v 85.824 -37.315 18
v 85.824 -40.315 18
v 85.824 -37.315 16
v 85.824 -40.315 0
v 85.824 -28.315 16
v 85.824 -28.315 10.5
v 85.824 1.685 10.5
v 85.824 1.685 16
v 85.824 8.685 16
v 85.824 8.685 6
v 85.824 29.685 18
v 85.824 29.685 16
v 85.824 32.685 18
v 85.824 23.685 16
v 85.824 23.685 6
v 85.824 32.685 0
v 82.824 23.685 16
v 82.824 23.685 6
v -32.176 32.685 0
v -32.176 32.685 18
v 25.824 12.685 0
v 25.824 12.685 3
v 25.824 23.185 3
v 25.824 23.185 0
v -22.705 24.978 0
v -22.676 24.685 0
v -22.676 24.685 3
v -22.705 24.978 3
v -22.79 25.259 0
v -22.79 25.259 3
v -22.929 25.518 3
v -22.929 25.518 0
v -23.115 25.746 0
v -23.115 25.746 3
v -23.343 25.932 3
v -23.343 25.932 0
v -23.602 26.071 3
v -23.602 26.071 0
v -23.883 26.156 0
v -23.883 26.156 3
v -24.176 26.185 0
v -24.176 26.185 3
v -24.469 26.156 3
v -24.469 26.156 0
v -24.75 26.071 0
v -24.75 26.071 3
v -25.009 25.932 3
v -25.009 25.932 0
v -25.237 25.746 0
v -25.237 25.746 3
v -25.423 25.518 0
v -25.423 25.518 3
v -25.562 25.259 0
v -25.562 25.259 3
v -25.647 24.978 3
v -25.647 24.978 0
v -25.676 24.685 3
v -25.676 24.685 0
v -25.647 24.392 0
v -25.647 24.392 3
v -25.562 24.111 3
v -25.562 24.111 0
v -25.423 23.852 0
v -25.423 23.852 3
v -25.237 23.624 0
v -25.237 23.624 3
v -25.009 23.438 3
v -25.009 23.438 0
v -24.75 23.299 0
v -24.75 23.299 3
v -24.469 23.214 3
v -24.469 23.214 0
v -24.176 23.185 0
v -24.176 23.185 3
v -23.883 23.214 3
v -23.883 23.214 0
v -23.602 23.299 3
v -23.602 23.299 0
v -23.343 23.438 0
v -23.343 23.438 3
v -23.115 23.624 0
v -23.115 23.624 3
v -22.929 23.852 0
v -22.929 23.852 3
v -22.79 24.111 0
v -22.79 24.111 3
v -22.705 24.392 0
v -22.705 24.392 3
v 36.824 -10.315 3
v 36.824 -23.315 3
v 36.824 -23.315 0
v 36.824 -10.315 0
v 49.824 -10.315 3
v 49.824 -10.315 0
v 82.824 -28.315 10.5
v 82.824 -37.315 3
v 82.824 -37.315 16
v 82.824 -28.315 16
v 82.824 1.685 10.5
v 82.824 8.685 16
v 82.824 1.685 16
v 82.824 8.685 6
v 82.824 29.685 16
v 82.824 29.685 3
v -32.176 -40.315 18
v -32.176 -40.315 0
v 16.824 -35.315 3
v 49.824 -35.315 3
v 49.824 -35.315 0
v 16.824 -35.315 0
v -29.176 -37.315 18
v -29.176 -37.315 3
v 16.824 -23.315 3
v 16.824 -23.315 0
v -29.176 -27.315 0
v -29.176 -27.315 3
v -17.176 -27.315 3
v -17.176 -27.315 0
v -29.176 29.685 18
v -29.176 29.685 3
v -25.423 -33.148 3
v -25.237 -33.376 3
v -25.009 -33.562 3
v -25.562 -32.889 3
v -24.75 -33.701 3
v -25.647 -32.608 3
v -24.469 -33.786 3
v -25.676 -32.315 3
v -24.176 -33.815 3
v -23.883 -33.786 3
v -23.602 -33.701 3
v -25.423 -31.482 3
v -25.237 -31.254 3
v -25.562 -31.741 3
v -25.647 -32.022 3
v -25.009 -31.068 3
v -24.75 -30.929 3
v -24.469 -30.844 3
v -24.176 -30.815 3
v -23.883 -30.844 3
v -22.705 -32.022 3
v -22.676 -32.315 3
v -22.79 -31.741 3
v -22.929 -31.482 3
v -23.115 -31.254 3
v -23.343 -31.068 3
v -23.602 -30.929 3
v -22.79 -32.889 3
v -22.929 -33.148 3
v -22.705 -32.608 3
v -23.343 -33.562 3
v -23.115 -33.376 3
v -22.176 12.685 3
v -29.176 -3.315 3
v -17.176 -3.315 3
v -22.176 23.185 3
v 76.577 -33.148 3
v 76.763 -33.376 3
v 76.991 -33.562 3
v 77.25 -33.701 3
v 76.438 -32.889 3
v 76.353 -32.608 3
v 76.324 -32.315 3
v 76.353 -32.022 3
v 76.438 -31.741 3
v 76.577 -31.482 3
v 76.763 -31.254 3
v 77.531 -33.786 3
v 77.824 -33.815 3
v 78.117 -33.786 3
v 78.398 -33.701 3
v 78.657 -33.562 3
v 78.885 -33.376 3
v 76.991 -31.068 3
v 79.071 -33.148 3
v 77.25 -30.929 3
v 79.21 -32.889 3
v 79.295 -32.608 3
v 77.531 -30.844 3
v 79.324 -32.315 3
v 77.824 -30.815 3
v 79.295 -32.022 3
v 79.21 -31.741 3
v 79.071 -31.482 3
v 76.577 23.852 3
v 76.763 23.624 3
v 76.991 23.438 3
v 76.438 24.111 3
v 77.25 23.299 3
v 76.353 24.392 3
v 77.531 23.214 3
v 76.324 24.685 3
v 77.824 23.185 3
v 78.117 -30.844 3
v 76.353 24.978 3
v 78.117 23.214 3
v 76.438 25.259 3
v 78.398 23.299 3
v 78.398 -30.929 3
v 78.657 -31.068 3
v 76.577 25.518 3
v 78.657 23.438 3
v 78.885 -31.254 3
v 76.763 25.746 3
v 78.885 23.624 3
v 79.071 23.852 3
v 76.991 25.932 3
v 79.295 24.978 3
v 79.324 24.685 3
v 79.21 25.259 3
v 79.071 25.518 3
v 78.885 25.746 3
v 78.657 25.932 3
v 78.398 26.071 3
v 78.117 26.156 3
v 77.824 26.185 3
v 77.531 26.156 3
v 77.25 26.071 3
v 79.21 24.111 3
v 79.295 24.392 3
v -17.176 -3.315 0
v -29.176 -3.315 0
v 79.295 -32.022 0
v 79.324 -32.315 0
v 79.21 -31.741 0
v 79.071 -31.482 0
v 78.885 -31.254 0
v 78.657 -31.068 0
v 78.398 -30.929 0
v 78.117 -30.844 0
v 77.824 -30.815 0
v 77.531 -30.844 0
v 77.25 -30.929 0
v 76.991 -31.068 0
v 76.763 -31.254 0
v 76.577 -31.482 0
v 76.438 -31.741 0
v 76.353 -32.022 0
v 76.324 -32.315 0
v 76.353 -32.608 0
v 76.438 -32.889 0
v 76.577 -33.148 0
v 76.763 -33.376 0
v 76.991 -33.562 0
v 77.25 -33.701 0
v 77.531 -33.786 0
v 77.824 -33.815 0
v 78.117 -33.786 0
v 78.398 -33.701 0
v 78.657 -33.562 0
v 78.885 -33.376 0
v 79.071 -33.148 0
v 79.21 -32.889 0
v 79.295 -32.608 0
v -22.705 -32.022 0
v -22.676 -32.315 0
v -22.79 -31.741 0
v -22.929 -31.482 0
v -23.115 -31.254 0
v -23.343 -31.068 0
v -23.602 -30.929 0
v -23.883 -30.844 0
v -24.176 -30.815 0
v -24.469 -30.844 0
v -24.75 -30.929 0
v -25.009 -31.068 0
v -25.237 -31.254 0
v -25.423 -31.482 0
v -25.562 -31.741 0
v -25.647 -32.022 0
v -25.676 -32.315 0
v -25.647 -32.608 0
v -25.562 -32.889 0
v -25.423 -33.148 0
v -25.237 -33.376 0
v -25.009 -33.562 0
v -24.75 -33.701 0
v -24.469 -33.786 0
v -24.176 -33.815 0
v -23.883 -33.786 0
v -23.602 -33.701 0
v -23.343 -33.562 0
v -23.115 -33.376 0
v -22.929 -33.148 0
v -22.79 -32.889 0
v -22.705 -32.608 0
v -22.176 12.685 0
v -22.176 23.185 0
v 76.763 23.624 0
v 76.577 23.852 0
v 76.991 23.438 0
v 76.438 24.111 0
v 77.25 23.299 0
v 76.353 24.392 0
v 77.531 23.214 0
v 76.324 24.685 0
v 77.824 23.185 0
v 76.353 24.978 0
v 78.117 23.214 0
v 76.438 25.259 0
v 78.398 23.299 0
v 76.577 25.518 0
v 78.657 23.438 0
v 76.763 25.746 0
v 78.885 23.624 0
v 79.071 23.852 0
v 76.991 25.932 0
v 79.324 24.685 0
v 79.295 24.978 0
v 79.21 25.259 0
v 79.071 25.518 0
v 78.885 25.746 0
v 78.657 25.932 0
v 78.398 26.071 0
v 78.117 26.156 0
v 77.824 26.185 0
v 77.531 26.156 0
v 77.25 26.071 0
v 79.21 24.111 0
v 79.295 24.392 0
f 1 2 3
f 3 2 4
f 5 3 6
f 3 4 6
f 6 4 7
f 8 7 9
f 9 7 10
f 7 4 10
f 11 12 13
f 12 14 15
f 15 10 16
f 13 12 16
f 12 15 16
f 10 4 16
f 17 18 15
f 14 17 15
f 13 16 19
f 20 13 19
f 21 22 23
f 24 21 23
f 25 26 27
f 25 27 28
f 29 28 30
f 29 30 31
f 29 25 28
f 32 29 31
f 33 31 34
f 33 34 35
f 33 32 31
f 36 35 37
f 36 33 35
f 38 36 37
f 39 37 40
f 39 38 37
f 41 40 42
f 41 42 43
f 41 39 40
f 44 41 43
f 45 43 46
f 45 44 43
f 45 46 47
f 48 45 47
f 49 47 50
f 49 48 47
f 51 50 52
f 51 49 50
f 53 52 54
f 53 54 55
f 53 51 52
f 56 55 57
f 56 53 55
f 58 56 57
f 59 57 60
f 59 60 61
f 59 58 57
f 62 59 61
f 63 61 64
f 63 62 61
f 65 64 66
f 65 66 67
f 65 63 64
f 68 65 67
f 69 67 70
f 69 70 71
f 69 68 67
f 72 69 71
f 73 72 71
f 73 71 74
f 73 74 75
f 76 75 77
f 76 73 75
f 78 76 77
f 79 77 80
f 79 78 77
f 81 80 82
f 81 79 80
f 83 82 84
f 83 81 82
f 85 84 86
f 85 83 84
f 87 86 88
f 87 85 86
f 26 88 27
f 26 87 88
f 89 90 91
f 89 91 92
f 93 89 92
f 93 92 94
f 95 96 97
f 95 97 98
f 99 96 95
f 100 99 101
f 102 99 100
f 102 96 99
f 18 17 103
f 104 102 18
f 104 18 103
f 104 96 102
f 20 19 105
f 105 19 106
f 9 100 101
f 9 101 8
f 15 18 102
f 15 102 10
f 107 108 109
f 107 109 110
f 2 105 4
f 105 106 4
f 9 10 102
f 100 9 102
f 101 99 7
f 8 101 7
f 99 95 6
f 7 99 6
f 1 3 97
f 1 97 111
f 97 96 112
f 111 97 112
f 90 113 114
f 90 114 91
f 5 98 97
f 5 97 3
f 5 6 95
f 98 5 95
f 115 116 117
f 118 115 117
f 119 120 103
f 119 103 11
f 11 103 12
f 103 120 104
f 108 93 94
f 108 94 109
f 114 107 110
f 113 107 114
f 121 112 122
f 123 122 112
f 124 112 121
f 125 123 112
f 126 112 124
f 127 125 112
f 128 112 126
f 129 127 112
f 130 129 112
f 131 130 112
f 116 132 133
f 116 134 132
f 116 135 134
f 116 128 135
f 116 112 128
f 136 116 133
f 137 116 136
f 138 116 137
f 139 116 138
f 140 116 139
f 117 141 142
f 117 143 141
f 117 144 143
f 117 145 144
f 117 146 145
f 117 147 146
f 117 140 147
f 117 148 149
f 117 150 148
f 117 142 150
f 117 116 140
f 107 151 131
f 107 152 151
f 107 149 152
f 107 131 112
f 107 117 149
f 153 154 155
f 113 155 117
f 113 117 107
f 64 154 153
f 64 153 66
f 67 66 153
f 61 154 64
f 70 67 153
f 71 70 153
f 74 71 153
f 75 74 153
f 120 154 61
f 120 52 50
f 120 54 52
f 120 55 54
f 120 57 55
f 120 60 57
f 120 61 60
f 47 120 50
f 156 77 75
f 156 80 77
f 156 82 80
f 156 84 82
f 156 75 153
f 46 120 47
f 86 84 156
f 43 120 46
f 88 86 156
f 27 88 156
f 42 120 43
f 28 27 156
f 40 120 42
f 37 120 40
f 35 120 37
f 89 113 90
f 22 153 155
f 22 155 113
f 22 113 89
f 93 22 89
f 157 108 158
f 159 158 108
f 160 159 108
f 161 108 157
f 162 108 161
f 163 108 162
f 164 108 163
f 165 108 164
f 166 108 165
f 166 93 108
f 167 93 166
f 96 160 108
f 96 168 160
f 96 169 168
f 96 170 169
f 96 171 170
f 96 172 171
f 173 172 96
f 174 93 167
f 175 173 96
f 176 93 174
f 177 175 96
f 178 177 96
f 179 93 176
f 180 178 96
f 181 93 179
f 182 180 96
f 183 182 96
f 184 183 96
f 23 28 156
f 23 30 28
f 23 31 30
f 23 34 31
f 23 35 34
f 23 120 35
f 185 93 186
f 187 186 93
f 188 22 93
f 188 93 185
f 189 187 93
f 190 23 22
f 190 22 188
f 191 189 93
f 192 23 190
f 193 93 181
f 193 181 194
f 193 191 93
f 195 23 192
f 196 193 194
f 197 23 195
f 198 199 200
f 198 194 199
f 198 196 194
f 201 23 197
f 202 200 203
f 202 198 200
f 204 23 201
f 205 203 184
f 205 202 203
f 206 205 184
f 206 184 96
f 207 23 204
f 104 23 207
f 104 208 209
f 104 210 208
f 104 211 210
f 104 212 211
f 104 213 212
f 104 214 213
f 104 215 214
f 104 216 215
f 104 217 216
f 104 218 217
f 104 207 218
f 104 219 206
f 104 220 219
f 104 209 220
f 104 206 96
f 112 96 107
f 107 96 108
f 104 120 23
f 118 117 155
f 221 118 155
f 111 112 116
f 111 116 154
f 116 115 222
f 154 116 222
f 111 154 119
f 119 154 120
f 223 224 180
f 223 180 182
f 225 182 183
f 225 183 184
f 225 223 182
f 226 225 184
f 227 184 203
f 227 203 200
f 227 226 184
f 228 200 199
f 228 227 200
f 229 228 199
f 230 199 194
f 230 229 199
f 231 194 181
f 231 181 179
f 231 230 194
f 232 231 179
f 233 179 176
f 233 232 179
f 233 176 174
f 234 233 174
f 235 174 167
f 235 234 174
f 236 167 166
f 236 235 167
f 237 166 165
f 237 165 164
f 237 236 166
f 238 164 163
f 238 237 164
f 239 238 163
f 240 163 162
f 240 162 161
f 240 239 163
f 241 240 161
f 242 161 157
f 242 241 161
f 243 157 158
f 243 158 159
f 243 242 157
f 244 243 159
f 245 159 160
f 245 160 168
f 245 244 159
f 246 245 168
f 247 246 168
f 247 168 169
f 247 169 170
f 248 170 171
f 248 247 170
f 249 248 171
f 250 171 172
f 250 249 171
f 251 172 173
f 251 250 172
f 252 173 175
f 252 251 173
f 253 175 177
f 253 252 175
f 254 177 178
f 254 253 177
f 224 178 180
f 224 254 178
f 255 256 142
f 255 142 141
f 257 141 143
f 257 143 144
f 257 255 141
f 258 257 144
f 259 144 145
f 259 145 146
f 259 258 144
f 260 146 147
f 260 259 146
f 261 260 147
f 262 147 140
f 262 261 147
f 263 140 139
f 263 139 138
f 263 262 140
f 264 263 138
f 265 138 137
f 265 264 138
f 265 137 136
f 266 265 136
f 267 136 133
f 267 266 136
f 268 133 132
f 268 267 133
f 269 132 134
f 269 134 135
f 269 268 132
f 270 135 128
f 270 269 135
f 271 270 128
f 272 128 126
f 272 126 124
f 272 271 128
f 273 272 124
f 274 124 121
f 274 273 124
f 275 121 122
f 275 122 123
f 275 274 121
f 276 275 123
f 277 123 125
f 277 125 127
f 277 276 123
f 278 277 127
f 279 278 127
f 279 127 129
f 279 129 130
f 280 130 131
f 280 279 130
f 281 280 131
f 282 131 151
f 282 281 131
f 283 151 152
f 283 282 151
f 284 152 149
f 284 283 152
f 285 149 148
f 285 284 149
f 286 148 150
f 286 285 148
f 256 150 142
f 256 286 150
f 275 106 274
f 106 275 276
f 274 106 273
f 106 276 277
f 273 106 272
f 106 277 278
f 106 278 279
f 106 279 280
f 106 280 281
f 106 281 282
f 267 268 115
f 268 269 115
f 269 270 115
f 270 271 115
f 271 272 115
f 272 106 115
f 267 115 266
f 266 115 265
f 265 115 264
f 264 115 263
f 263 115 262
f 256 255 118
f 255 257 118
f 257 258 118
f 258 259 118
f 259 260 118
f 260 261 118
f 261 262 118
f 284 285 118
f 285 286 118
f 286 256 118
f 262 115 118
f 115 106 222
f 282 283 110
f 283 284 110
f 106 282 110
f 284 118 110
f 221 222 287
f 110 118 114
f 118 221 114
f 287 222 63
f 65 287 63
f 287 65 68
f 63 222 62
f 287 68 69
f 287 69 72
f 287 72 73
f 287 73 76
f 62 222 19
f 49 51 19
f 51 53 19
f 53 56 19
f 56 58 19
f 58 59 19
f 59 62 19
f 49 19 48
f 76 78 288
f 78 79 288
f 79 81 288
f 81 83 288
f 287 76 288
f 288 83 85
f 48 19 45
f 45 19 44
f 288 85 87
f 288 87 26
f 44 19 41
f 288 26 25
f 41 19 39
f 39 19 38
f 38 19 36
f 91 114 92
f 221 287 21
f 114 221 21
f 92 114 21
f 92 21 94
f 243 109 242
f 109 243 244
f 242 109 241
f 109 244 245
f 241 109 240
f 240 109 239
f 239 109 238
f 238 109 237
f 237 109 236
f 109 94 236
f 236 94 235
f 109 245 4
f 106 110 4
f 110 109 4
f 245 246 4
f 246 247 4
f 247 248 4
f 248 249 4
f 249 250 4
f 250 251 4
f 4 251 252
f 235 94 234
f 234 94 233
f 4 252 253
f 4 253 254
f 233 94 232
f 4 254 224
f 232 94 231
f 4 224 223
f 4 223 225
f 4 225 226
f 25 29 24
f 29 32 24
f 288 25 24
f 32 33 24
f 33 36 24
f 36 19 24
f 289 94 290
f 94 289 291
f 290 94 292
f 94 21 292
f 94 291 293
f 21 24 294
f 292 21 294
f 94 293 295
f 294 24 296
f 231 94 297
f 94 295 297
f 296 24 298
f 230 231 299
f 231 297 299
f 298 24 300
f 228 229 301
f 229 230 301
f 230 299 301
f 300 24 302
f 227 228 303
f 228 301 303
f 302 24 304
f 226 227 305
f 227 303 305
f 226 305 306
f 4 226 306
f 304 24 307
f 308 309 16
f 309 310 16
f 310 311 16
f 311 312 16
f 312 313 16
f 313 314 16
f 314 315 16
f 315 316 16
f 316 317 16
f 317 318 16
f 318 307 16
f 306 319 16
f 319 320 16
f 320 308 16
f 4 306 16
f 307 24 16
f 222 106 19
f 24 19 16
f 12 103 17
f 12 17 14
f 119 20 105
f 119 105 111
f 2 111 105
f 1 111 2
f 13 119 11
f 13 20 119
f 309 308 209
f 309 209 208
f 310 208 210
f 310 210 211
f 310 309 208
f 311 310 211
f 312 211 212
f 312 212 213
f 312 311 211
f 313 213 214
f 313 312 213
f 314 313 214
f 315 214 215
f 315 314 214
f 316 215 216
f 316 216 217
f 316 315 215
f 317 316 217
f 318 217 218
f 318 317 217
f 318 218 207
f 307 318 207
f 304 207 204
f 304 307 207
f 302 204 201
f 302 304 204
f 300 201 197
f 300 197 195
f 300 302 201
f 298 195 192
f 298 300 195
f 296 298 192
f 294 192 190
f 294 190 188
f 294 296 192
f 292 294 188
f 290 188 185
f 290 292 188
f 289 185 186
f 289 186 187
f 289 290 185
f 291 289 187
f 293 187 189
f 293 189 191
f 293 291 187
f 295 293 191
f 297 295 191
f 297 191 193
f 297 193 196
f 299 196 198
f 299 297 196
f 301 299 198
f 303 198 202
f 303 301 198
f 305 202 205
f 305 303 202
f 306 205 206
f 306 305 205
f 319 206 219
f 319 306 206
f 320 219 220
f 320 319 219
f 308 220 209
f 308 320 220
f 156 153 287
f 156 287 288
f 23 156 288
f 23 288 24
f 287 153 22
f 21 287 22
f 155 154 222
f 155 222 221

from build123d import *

# Parameters (mm, degrees)
SKETCH_1_W          = 118
SKETCH_1_H          = 73
SKETCH_1_R          = 1.5
EXTRUDE_1_DEPTH     = 3
EXTRUDE_2_DEPTH     = 15
SKETCH_3_W          = 3
SKETCH_3_H          = 6
EXTRUDE_3_DEPTH     = 13
SKETCH_4_W          = 3
SKETCH_4_H          = 15
EXTRUDE_4_DEPTH     = 3
SKETCH_5_W          = 3
SKETCH_5_H          = 30
EXTRUDE_5_DEPTH     = 7.5
SKETCH_7_W          = 12
SKETCH_7_H          = 24
CUT_EXTRUDE_2_DEPTH = 3
SKETCH_6_W          = 48
SKETCH_6_H          = 10.5
CUT_EXTRUDE_4_DEPTH = 3


with BuildPart() as part:
    # 草图1 → 凸台-拉伸1 (new body)
    with BuildSketch(Plane.XY):
        with Locations((26.824038132, -3.814969101)):
            Rectangle(SKETCH_1_W, SKETCH_1_H)
        with Locations((-24.175961868, 24.685030899)):
            Circle(SKETCH_1_R, mode=Mode.SUBTRACT)
        with Locations((-24.175961868, -32.314969101)):
            Circle(SKETCH_1_R, mode=Mode.SUBTRACT)
        with Locations((77.824038132, 24.685030899)):
            Circle(SKETCH_1_R, mode=Mode.SUBTRACT)
        with Locations((77.824038132, -32.314969101)):
            Circle(SKETCH_1_R, mode=Mode.SUBTRACT)
    extrude(amount=EXTRUDE_1_DEPTH)

    # 草图2 → 凸台-拉伸2 (add)
    with BuildSketch(Plane.XY.offset(3)):
        Polygon((-32.175961868, 32.685030899), (-32.175961868, 29.685030899), (-32.175961868, -37.314969101), (-32.175961868, -40.314969101), (85.824038132, -40.314969101), (85.824038132, -37.314969101), (-29.175961868, -37.314969101), (-29.175961868, 29.685030899), (85.824038132, 29.685030899), (85.824038132, 32.685030899), align=None)
    extrude(amount=EXTRUDE_2_DEPTH)

    # 草图3 → 凸台-拉伸3 (add)
    with BuildSketch(Plane.XY.offset(3)):
        Polygon((85.824038132, 3.618173266), (85.824038132, 8.685030899), (82.824038132, 8.685030899), (82.824038132, 1.685030899), (85.824038132, 1.685030899), align=None)
        with Locations((84.324038132, 26.685030899)):
            Rectangle(SKETCH_3_W, SKETCH_3_H)
        Polygon((85.824038132, -37.314969101), (85.824038132, -28.314969101), (85.2282411, -28.314969101), (82.824038132, -28.314969101), (82.824038132, -37.314969101), align=None)
    extrude(amount=EXTRUDE_3_DEPTH)

    # 草图4 → 凸台-拉伸4 (add)
    with BuildSketch(Plane.XY.offset(3)):
        with Locations((84.324038132, 16.185030899)):
            Rectangle(SKETCH_4_W, SKETCH_4_H)
    extrude(amount=EXTRUDE_4_DEPTH)

    # 草图5 → 凸台-拉伸5 (add)
    with BuildSketch(Plane.XY.offset(3)):
        with Locations((84.324038132, -13.314969101)):
            Rectangle(SKETCH_5_W, SKETCH_5_H)
    extrude(amount=EXTRUDE_5_DEPTH)

    # 草图7 → 切除-拉伸2 (cut)
    with BuildSketch(Plane.XY.offset(3)):
        Polygon((16.824038132, -35.314969101), (16.824038132, -23.314969101), (36.824038132, -23.314969101), (36.824038132, -10.314969101), (49.824038132, -10.314969101), (49.824038132, -35.314969101), align=None)
        with Locations((-23.175961868, -15.314969101)):
            Rectangle(SKETCH_7_W, SKETCH_7_H)
    extrude(amount=-CUT_EXTRUDE_2_DEPTH, mode=Mode.SUBTRACT)

    # 草图6 → 切除-拉伸4 (cut)
    with BuildSketch(Plane.XY.offset(3)):
        with Locations((1.824038132, 17.935030899)):
            Rectangle(SKETCH_6_W, SKETCH_6_H)
    extrude(amount=-CUT_EXTRUDE_4_DEPTH, mode=Mode.SUBTRACT)


solid = part.part
